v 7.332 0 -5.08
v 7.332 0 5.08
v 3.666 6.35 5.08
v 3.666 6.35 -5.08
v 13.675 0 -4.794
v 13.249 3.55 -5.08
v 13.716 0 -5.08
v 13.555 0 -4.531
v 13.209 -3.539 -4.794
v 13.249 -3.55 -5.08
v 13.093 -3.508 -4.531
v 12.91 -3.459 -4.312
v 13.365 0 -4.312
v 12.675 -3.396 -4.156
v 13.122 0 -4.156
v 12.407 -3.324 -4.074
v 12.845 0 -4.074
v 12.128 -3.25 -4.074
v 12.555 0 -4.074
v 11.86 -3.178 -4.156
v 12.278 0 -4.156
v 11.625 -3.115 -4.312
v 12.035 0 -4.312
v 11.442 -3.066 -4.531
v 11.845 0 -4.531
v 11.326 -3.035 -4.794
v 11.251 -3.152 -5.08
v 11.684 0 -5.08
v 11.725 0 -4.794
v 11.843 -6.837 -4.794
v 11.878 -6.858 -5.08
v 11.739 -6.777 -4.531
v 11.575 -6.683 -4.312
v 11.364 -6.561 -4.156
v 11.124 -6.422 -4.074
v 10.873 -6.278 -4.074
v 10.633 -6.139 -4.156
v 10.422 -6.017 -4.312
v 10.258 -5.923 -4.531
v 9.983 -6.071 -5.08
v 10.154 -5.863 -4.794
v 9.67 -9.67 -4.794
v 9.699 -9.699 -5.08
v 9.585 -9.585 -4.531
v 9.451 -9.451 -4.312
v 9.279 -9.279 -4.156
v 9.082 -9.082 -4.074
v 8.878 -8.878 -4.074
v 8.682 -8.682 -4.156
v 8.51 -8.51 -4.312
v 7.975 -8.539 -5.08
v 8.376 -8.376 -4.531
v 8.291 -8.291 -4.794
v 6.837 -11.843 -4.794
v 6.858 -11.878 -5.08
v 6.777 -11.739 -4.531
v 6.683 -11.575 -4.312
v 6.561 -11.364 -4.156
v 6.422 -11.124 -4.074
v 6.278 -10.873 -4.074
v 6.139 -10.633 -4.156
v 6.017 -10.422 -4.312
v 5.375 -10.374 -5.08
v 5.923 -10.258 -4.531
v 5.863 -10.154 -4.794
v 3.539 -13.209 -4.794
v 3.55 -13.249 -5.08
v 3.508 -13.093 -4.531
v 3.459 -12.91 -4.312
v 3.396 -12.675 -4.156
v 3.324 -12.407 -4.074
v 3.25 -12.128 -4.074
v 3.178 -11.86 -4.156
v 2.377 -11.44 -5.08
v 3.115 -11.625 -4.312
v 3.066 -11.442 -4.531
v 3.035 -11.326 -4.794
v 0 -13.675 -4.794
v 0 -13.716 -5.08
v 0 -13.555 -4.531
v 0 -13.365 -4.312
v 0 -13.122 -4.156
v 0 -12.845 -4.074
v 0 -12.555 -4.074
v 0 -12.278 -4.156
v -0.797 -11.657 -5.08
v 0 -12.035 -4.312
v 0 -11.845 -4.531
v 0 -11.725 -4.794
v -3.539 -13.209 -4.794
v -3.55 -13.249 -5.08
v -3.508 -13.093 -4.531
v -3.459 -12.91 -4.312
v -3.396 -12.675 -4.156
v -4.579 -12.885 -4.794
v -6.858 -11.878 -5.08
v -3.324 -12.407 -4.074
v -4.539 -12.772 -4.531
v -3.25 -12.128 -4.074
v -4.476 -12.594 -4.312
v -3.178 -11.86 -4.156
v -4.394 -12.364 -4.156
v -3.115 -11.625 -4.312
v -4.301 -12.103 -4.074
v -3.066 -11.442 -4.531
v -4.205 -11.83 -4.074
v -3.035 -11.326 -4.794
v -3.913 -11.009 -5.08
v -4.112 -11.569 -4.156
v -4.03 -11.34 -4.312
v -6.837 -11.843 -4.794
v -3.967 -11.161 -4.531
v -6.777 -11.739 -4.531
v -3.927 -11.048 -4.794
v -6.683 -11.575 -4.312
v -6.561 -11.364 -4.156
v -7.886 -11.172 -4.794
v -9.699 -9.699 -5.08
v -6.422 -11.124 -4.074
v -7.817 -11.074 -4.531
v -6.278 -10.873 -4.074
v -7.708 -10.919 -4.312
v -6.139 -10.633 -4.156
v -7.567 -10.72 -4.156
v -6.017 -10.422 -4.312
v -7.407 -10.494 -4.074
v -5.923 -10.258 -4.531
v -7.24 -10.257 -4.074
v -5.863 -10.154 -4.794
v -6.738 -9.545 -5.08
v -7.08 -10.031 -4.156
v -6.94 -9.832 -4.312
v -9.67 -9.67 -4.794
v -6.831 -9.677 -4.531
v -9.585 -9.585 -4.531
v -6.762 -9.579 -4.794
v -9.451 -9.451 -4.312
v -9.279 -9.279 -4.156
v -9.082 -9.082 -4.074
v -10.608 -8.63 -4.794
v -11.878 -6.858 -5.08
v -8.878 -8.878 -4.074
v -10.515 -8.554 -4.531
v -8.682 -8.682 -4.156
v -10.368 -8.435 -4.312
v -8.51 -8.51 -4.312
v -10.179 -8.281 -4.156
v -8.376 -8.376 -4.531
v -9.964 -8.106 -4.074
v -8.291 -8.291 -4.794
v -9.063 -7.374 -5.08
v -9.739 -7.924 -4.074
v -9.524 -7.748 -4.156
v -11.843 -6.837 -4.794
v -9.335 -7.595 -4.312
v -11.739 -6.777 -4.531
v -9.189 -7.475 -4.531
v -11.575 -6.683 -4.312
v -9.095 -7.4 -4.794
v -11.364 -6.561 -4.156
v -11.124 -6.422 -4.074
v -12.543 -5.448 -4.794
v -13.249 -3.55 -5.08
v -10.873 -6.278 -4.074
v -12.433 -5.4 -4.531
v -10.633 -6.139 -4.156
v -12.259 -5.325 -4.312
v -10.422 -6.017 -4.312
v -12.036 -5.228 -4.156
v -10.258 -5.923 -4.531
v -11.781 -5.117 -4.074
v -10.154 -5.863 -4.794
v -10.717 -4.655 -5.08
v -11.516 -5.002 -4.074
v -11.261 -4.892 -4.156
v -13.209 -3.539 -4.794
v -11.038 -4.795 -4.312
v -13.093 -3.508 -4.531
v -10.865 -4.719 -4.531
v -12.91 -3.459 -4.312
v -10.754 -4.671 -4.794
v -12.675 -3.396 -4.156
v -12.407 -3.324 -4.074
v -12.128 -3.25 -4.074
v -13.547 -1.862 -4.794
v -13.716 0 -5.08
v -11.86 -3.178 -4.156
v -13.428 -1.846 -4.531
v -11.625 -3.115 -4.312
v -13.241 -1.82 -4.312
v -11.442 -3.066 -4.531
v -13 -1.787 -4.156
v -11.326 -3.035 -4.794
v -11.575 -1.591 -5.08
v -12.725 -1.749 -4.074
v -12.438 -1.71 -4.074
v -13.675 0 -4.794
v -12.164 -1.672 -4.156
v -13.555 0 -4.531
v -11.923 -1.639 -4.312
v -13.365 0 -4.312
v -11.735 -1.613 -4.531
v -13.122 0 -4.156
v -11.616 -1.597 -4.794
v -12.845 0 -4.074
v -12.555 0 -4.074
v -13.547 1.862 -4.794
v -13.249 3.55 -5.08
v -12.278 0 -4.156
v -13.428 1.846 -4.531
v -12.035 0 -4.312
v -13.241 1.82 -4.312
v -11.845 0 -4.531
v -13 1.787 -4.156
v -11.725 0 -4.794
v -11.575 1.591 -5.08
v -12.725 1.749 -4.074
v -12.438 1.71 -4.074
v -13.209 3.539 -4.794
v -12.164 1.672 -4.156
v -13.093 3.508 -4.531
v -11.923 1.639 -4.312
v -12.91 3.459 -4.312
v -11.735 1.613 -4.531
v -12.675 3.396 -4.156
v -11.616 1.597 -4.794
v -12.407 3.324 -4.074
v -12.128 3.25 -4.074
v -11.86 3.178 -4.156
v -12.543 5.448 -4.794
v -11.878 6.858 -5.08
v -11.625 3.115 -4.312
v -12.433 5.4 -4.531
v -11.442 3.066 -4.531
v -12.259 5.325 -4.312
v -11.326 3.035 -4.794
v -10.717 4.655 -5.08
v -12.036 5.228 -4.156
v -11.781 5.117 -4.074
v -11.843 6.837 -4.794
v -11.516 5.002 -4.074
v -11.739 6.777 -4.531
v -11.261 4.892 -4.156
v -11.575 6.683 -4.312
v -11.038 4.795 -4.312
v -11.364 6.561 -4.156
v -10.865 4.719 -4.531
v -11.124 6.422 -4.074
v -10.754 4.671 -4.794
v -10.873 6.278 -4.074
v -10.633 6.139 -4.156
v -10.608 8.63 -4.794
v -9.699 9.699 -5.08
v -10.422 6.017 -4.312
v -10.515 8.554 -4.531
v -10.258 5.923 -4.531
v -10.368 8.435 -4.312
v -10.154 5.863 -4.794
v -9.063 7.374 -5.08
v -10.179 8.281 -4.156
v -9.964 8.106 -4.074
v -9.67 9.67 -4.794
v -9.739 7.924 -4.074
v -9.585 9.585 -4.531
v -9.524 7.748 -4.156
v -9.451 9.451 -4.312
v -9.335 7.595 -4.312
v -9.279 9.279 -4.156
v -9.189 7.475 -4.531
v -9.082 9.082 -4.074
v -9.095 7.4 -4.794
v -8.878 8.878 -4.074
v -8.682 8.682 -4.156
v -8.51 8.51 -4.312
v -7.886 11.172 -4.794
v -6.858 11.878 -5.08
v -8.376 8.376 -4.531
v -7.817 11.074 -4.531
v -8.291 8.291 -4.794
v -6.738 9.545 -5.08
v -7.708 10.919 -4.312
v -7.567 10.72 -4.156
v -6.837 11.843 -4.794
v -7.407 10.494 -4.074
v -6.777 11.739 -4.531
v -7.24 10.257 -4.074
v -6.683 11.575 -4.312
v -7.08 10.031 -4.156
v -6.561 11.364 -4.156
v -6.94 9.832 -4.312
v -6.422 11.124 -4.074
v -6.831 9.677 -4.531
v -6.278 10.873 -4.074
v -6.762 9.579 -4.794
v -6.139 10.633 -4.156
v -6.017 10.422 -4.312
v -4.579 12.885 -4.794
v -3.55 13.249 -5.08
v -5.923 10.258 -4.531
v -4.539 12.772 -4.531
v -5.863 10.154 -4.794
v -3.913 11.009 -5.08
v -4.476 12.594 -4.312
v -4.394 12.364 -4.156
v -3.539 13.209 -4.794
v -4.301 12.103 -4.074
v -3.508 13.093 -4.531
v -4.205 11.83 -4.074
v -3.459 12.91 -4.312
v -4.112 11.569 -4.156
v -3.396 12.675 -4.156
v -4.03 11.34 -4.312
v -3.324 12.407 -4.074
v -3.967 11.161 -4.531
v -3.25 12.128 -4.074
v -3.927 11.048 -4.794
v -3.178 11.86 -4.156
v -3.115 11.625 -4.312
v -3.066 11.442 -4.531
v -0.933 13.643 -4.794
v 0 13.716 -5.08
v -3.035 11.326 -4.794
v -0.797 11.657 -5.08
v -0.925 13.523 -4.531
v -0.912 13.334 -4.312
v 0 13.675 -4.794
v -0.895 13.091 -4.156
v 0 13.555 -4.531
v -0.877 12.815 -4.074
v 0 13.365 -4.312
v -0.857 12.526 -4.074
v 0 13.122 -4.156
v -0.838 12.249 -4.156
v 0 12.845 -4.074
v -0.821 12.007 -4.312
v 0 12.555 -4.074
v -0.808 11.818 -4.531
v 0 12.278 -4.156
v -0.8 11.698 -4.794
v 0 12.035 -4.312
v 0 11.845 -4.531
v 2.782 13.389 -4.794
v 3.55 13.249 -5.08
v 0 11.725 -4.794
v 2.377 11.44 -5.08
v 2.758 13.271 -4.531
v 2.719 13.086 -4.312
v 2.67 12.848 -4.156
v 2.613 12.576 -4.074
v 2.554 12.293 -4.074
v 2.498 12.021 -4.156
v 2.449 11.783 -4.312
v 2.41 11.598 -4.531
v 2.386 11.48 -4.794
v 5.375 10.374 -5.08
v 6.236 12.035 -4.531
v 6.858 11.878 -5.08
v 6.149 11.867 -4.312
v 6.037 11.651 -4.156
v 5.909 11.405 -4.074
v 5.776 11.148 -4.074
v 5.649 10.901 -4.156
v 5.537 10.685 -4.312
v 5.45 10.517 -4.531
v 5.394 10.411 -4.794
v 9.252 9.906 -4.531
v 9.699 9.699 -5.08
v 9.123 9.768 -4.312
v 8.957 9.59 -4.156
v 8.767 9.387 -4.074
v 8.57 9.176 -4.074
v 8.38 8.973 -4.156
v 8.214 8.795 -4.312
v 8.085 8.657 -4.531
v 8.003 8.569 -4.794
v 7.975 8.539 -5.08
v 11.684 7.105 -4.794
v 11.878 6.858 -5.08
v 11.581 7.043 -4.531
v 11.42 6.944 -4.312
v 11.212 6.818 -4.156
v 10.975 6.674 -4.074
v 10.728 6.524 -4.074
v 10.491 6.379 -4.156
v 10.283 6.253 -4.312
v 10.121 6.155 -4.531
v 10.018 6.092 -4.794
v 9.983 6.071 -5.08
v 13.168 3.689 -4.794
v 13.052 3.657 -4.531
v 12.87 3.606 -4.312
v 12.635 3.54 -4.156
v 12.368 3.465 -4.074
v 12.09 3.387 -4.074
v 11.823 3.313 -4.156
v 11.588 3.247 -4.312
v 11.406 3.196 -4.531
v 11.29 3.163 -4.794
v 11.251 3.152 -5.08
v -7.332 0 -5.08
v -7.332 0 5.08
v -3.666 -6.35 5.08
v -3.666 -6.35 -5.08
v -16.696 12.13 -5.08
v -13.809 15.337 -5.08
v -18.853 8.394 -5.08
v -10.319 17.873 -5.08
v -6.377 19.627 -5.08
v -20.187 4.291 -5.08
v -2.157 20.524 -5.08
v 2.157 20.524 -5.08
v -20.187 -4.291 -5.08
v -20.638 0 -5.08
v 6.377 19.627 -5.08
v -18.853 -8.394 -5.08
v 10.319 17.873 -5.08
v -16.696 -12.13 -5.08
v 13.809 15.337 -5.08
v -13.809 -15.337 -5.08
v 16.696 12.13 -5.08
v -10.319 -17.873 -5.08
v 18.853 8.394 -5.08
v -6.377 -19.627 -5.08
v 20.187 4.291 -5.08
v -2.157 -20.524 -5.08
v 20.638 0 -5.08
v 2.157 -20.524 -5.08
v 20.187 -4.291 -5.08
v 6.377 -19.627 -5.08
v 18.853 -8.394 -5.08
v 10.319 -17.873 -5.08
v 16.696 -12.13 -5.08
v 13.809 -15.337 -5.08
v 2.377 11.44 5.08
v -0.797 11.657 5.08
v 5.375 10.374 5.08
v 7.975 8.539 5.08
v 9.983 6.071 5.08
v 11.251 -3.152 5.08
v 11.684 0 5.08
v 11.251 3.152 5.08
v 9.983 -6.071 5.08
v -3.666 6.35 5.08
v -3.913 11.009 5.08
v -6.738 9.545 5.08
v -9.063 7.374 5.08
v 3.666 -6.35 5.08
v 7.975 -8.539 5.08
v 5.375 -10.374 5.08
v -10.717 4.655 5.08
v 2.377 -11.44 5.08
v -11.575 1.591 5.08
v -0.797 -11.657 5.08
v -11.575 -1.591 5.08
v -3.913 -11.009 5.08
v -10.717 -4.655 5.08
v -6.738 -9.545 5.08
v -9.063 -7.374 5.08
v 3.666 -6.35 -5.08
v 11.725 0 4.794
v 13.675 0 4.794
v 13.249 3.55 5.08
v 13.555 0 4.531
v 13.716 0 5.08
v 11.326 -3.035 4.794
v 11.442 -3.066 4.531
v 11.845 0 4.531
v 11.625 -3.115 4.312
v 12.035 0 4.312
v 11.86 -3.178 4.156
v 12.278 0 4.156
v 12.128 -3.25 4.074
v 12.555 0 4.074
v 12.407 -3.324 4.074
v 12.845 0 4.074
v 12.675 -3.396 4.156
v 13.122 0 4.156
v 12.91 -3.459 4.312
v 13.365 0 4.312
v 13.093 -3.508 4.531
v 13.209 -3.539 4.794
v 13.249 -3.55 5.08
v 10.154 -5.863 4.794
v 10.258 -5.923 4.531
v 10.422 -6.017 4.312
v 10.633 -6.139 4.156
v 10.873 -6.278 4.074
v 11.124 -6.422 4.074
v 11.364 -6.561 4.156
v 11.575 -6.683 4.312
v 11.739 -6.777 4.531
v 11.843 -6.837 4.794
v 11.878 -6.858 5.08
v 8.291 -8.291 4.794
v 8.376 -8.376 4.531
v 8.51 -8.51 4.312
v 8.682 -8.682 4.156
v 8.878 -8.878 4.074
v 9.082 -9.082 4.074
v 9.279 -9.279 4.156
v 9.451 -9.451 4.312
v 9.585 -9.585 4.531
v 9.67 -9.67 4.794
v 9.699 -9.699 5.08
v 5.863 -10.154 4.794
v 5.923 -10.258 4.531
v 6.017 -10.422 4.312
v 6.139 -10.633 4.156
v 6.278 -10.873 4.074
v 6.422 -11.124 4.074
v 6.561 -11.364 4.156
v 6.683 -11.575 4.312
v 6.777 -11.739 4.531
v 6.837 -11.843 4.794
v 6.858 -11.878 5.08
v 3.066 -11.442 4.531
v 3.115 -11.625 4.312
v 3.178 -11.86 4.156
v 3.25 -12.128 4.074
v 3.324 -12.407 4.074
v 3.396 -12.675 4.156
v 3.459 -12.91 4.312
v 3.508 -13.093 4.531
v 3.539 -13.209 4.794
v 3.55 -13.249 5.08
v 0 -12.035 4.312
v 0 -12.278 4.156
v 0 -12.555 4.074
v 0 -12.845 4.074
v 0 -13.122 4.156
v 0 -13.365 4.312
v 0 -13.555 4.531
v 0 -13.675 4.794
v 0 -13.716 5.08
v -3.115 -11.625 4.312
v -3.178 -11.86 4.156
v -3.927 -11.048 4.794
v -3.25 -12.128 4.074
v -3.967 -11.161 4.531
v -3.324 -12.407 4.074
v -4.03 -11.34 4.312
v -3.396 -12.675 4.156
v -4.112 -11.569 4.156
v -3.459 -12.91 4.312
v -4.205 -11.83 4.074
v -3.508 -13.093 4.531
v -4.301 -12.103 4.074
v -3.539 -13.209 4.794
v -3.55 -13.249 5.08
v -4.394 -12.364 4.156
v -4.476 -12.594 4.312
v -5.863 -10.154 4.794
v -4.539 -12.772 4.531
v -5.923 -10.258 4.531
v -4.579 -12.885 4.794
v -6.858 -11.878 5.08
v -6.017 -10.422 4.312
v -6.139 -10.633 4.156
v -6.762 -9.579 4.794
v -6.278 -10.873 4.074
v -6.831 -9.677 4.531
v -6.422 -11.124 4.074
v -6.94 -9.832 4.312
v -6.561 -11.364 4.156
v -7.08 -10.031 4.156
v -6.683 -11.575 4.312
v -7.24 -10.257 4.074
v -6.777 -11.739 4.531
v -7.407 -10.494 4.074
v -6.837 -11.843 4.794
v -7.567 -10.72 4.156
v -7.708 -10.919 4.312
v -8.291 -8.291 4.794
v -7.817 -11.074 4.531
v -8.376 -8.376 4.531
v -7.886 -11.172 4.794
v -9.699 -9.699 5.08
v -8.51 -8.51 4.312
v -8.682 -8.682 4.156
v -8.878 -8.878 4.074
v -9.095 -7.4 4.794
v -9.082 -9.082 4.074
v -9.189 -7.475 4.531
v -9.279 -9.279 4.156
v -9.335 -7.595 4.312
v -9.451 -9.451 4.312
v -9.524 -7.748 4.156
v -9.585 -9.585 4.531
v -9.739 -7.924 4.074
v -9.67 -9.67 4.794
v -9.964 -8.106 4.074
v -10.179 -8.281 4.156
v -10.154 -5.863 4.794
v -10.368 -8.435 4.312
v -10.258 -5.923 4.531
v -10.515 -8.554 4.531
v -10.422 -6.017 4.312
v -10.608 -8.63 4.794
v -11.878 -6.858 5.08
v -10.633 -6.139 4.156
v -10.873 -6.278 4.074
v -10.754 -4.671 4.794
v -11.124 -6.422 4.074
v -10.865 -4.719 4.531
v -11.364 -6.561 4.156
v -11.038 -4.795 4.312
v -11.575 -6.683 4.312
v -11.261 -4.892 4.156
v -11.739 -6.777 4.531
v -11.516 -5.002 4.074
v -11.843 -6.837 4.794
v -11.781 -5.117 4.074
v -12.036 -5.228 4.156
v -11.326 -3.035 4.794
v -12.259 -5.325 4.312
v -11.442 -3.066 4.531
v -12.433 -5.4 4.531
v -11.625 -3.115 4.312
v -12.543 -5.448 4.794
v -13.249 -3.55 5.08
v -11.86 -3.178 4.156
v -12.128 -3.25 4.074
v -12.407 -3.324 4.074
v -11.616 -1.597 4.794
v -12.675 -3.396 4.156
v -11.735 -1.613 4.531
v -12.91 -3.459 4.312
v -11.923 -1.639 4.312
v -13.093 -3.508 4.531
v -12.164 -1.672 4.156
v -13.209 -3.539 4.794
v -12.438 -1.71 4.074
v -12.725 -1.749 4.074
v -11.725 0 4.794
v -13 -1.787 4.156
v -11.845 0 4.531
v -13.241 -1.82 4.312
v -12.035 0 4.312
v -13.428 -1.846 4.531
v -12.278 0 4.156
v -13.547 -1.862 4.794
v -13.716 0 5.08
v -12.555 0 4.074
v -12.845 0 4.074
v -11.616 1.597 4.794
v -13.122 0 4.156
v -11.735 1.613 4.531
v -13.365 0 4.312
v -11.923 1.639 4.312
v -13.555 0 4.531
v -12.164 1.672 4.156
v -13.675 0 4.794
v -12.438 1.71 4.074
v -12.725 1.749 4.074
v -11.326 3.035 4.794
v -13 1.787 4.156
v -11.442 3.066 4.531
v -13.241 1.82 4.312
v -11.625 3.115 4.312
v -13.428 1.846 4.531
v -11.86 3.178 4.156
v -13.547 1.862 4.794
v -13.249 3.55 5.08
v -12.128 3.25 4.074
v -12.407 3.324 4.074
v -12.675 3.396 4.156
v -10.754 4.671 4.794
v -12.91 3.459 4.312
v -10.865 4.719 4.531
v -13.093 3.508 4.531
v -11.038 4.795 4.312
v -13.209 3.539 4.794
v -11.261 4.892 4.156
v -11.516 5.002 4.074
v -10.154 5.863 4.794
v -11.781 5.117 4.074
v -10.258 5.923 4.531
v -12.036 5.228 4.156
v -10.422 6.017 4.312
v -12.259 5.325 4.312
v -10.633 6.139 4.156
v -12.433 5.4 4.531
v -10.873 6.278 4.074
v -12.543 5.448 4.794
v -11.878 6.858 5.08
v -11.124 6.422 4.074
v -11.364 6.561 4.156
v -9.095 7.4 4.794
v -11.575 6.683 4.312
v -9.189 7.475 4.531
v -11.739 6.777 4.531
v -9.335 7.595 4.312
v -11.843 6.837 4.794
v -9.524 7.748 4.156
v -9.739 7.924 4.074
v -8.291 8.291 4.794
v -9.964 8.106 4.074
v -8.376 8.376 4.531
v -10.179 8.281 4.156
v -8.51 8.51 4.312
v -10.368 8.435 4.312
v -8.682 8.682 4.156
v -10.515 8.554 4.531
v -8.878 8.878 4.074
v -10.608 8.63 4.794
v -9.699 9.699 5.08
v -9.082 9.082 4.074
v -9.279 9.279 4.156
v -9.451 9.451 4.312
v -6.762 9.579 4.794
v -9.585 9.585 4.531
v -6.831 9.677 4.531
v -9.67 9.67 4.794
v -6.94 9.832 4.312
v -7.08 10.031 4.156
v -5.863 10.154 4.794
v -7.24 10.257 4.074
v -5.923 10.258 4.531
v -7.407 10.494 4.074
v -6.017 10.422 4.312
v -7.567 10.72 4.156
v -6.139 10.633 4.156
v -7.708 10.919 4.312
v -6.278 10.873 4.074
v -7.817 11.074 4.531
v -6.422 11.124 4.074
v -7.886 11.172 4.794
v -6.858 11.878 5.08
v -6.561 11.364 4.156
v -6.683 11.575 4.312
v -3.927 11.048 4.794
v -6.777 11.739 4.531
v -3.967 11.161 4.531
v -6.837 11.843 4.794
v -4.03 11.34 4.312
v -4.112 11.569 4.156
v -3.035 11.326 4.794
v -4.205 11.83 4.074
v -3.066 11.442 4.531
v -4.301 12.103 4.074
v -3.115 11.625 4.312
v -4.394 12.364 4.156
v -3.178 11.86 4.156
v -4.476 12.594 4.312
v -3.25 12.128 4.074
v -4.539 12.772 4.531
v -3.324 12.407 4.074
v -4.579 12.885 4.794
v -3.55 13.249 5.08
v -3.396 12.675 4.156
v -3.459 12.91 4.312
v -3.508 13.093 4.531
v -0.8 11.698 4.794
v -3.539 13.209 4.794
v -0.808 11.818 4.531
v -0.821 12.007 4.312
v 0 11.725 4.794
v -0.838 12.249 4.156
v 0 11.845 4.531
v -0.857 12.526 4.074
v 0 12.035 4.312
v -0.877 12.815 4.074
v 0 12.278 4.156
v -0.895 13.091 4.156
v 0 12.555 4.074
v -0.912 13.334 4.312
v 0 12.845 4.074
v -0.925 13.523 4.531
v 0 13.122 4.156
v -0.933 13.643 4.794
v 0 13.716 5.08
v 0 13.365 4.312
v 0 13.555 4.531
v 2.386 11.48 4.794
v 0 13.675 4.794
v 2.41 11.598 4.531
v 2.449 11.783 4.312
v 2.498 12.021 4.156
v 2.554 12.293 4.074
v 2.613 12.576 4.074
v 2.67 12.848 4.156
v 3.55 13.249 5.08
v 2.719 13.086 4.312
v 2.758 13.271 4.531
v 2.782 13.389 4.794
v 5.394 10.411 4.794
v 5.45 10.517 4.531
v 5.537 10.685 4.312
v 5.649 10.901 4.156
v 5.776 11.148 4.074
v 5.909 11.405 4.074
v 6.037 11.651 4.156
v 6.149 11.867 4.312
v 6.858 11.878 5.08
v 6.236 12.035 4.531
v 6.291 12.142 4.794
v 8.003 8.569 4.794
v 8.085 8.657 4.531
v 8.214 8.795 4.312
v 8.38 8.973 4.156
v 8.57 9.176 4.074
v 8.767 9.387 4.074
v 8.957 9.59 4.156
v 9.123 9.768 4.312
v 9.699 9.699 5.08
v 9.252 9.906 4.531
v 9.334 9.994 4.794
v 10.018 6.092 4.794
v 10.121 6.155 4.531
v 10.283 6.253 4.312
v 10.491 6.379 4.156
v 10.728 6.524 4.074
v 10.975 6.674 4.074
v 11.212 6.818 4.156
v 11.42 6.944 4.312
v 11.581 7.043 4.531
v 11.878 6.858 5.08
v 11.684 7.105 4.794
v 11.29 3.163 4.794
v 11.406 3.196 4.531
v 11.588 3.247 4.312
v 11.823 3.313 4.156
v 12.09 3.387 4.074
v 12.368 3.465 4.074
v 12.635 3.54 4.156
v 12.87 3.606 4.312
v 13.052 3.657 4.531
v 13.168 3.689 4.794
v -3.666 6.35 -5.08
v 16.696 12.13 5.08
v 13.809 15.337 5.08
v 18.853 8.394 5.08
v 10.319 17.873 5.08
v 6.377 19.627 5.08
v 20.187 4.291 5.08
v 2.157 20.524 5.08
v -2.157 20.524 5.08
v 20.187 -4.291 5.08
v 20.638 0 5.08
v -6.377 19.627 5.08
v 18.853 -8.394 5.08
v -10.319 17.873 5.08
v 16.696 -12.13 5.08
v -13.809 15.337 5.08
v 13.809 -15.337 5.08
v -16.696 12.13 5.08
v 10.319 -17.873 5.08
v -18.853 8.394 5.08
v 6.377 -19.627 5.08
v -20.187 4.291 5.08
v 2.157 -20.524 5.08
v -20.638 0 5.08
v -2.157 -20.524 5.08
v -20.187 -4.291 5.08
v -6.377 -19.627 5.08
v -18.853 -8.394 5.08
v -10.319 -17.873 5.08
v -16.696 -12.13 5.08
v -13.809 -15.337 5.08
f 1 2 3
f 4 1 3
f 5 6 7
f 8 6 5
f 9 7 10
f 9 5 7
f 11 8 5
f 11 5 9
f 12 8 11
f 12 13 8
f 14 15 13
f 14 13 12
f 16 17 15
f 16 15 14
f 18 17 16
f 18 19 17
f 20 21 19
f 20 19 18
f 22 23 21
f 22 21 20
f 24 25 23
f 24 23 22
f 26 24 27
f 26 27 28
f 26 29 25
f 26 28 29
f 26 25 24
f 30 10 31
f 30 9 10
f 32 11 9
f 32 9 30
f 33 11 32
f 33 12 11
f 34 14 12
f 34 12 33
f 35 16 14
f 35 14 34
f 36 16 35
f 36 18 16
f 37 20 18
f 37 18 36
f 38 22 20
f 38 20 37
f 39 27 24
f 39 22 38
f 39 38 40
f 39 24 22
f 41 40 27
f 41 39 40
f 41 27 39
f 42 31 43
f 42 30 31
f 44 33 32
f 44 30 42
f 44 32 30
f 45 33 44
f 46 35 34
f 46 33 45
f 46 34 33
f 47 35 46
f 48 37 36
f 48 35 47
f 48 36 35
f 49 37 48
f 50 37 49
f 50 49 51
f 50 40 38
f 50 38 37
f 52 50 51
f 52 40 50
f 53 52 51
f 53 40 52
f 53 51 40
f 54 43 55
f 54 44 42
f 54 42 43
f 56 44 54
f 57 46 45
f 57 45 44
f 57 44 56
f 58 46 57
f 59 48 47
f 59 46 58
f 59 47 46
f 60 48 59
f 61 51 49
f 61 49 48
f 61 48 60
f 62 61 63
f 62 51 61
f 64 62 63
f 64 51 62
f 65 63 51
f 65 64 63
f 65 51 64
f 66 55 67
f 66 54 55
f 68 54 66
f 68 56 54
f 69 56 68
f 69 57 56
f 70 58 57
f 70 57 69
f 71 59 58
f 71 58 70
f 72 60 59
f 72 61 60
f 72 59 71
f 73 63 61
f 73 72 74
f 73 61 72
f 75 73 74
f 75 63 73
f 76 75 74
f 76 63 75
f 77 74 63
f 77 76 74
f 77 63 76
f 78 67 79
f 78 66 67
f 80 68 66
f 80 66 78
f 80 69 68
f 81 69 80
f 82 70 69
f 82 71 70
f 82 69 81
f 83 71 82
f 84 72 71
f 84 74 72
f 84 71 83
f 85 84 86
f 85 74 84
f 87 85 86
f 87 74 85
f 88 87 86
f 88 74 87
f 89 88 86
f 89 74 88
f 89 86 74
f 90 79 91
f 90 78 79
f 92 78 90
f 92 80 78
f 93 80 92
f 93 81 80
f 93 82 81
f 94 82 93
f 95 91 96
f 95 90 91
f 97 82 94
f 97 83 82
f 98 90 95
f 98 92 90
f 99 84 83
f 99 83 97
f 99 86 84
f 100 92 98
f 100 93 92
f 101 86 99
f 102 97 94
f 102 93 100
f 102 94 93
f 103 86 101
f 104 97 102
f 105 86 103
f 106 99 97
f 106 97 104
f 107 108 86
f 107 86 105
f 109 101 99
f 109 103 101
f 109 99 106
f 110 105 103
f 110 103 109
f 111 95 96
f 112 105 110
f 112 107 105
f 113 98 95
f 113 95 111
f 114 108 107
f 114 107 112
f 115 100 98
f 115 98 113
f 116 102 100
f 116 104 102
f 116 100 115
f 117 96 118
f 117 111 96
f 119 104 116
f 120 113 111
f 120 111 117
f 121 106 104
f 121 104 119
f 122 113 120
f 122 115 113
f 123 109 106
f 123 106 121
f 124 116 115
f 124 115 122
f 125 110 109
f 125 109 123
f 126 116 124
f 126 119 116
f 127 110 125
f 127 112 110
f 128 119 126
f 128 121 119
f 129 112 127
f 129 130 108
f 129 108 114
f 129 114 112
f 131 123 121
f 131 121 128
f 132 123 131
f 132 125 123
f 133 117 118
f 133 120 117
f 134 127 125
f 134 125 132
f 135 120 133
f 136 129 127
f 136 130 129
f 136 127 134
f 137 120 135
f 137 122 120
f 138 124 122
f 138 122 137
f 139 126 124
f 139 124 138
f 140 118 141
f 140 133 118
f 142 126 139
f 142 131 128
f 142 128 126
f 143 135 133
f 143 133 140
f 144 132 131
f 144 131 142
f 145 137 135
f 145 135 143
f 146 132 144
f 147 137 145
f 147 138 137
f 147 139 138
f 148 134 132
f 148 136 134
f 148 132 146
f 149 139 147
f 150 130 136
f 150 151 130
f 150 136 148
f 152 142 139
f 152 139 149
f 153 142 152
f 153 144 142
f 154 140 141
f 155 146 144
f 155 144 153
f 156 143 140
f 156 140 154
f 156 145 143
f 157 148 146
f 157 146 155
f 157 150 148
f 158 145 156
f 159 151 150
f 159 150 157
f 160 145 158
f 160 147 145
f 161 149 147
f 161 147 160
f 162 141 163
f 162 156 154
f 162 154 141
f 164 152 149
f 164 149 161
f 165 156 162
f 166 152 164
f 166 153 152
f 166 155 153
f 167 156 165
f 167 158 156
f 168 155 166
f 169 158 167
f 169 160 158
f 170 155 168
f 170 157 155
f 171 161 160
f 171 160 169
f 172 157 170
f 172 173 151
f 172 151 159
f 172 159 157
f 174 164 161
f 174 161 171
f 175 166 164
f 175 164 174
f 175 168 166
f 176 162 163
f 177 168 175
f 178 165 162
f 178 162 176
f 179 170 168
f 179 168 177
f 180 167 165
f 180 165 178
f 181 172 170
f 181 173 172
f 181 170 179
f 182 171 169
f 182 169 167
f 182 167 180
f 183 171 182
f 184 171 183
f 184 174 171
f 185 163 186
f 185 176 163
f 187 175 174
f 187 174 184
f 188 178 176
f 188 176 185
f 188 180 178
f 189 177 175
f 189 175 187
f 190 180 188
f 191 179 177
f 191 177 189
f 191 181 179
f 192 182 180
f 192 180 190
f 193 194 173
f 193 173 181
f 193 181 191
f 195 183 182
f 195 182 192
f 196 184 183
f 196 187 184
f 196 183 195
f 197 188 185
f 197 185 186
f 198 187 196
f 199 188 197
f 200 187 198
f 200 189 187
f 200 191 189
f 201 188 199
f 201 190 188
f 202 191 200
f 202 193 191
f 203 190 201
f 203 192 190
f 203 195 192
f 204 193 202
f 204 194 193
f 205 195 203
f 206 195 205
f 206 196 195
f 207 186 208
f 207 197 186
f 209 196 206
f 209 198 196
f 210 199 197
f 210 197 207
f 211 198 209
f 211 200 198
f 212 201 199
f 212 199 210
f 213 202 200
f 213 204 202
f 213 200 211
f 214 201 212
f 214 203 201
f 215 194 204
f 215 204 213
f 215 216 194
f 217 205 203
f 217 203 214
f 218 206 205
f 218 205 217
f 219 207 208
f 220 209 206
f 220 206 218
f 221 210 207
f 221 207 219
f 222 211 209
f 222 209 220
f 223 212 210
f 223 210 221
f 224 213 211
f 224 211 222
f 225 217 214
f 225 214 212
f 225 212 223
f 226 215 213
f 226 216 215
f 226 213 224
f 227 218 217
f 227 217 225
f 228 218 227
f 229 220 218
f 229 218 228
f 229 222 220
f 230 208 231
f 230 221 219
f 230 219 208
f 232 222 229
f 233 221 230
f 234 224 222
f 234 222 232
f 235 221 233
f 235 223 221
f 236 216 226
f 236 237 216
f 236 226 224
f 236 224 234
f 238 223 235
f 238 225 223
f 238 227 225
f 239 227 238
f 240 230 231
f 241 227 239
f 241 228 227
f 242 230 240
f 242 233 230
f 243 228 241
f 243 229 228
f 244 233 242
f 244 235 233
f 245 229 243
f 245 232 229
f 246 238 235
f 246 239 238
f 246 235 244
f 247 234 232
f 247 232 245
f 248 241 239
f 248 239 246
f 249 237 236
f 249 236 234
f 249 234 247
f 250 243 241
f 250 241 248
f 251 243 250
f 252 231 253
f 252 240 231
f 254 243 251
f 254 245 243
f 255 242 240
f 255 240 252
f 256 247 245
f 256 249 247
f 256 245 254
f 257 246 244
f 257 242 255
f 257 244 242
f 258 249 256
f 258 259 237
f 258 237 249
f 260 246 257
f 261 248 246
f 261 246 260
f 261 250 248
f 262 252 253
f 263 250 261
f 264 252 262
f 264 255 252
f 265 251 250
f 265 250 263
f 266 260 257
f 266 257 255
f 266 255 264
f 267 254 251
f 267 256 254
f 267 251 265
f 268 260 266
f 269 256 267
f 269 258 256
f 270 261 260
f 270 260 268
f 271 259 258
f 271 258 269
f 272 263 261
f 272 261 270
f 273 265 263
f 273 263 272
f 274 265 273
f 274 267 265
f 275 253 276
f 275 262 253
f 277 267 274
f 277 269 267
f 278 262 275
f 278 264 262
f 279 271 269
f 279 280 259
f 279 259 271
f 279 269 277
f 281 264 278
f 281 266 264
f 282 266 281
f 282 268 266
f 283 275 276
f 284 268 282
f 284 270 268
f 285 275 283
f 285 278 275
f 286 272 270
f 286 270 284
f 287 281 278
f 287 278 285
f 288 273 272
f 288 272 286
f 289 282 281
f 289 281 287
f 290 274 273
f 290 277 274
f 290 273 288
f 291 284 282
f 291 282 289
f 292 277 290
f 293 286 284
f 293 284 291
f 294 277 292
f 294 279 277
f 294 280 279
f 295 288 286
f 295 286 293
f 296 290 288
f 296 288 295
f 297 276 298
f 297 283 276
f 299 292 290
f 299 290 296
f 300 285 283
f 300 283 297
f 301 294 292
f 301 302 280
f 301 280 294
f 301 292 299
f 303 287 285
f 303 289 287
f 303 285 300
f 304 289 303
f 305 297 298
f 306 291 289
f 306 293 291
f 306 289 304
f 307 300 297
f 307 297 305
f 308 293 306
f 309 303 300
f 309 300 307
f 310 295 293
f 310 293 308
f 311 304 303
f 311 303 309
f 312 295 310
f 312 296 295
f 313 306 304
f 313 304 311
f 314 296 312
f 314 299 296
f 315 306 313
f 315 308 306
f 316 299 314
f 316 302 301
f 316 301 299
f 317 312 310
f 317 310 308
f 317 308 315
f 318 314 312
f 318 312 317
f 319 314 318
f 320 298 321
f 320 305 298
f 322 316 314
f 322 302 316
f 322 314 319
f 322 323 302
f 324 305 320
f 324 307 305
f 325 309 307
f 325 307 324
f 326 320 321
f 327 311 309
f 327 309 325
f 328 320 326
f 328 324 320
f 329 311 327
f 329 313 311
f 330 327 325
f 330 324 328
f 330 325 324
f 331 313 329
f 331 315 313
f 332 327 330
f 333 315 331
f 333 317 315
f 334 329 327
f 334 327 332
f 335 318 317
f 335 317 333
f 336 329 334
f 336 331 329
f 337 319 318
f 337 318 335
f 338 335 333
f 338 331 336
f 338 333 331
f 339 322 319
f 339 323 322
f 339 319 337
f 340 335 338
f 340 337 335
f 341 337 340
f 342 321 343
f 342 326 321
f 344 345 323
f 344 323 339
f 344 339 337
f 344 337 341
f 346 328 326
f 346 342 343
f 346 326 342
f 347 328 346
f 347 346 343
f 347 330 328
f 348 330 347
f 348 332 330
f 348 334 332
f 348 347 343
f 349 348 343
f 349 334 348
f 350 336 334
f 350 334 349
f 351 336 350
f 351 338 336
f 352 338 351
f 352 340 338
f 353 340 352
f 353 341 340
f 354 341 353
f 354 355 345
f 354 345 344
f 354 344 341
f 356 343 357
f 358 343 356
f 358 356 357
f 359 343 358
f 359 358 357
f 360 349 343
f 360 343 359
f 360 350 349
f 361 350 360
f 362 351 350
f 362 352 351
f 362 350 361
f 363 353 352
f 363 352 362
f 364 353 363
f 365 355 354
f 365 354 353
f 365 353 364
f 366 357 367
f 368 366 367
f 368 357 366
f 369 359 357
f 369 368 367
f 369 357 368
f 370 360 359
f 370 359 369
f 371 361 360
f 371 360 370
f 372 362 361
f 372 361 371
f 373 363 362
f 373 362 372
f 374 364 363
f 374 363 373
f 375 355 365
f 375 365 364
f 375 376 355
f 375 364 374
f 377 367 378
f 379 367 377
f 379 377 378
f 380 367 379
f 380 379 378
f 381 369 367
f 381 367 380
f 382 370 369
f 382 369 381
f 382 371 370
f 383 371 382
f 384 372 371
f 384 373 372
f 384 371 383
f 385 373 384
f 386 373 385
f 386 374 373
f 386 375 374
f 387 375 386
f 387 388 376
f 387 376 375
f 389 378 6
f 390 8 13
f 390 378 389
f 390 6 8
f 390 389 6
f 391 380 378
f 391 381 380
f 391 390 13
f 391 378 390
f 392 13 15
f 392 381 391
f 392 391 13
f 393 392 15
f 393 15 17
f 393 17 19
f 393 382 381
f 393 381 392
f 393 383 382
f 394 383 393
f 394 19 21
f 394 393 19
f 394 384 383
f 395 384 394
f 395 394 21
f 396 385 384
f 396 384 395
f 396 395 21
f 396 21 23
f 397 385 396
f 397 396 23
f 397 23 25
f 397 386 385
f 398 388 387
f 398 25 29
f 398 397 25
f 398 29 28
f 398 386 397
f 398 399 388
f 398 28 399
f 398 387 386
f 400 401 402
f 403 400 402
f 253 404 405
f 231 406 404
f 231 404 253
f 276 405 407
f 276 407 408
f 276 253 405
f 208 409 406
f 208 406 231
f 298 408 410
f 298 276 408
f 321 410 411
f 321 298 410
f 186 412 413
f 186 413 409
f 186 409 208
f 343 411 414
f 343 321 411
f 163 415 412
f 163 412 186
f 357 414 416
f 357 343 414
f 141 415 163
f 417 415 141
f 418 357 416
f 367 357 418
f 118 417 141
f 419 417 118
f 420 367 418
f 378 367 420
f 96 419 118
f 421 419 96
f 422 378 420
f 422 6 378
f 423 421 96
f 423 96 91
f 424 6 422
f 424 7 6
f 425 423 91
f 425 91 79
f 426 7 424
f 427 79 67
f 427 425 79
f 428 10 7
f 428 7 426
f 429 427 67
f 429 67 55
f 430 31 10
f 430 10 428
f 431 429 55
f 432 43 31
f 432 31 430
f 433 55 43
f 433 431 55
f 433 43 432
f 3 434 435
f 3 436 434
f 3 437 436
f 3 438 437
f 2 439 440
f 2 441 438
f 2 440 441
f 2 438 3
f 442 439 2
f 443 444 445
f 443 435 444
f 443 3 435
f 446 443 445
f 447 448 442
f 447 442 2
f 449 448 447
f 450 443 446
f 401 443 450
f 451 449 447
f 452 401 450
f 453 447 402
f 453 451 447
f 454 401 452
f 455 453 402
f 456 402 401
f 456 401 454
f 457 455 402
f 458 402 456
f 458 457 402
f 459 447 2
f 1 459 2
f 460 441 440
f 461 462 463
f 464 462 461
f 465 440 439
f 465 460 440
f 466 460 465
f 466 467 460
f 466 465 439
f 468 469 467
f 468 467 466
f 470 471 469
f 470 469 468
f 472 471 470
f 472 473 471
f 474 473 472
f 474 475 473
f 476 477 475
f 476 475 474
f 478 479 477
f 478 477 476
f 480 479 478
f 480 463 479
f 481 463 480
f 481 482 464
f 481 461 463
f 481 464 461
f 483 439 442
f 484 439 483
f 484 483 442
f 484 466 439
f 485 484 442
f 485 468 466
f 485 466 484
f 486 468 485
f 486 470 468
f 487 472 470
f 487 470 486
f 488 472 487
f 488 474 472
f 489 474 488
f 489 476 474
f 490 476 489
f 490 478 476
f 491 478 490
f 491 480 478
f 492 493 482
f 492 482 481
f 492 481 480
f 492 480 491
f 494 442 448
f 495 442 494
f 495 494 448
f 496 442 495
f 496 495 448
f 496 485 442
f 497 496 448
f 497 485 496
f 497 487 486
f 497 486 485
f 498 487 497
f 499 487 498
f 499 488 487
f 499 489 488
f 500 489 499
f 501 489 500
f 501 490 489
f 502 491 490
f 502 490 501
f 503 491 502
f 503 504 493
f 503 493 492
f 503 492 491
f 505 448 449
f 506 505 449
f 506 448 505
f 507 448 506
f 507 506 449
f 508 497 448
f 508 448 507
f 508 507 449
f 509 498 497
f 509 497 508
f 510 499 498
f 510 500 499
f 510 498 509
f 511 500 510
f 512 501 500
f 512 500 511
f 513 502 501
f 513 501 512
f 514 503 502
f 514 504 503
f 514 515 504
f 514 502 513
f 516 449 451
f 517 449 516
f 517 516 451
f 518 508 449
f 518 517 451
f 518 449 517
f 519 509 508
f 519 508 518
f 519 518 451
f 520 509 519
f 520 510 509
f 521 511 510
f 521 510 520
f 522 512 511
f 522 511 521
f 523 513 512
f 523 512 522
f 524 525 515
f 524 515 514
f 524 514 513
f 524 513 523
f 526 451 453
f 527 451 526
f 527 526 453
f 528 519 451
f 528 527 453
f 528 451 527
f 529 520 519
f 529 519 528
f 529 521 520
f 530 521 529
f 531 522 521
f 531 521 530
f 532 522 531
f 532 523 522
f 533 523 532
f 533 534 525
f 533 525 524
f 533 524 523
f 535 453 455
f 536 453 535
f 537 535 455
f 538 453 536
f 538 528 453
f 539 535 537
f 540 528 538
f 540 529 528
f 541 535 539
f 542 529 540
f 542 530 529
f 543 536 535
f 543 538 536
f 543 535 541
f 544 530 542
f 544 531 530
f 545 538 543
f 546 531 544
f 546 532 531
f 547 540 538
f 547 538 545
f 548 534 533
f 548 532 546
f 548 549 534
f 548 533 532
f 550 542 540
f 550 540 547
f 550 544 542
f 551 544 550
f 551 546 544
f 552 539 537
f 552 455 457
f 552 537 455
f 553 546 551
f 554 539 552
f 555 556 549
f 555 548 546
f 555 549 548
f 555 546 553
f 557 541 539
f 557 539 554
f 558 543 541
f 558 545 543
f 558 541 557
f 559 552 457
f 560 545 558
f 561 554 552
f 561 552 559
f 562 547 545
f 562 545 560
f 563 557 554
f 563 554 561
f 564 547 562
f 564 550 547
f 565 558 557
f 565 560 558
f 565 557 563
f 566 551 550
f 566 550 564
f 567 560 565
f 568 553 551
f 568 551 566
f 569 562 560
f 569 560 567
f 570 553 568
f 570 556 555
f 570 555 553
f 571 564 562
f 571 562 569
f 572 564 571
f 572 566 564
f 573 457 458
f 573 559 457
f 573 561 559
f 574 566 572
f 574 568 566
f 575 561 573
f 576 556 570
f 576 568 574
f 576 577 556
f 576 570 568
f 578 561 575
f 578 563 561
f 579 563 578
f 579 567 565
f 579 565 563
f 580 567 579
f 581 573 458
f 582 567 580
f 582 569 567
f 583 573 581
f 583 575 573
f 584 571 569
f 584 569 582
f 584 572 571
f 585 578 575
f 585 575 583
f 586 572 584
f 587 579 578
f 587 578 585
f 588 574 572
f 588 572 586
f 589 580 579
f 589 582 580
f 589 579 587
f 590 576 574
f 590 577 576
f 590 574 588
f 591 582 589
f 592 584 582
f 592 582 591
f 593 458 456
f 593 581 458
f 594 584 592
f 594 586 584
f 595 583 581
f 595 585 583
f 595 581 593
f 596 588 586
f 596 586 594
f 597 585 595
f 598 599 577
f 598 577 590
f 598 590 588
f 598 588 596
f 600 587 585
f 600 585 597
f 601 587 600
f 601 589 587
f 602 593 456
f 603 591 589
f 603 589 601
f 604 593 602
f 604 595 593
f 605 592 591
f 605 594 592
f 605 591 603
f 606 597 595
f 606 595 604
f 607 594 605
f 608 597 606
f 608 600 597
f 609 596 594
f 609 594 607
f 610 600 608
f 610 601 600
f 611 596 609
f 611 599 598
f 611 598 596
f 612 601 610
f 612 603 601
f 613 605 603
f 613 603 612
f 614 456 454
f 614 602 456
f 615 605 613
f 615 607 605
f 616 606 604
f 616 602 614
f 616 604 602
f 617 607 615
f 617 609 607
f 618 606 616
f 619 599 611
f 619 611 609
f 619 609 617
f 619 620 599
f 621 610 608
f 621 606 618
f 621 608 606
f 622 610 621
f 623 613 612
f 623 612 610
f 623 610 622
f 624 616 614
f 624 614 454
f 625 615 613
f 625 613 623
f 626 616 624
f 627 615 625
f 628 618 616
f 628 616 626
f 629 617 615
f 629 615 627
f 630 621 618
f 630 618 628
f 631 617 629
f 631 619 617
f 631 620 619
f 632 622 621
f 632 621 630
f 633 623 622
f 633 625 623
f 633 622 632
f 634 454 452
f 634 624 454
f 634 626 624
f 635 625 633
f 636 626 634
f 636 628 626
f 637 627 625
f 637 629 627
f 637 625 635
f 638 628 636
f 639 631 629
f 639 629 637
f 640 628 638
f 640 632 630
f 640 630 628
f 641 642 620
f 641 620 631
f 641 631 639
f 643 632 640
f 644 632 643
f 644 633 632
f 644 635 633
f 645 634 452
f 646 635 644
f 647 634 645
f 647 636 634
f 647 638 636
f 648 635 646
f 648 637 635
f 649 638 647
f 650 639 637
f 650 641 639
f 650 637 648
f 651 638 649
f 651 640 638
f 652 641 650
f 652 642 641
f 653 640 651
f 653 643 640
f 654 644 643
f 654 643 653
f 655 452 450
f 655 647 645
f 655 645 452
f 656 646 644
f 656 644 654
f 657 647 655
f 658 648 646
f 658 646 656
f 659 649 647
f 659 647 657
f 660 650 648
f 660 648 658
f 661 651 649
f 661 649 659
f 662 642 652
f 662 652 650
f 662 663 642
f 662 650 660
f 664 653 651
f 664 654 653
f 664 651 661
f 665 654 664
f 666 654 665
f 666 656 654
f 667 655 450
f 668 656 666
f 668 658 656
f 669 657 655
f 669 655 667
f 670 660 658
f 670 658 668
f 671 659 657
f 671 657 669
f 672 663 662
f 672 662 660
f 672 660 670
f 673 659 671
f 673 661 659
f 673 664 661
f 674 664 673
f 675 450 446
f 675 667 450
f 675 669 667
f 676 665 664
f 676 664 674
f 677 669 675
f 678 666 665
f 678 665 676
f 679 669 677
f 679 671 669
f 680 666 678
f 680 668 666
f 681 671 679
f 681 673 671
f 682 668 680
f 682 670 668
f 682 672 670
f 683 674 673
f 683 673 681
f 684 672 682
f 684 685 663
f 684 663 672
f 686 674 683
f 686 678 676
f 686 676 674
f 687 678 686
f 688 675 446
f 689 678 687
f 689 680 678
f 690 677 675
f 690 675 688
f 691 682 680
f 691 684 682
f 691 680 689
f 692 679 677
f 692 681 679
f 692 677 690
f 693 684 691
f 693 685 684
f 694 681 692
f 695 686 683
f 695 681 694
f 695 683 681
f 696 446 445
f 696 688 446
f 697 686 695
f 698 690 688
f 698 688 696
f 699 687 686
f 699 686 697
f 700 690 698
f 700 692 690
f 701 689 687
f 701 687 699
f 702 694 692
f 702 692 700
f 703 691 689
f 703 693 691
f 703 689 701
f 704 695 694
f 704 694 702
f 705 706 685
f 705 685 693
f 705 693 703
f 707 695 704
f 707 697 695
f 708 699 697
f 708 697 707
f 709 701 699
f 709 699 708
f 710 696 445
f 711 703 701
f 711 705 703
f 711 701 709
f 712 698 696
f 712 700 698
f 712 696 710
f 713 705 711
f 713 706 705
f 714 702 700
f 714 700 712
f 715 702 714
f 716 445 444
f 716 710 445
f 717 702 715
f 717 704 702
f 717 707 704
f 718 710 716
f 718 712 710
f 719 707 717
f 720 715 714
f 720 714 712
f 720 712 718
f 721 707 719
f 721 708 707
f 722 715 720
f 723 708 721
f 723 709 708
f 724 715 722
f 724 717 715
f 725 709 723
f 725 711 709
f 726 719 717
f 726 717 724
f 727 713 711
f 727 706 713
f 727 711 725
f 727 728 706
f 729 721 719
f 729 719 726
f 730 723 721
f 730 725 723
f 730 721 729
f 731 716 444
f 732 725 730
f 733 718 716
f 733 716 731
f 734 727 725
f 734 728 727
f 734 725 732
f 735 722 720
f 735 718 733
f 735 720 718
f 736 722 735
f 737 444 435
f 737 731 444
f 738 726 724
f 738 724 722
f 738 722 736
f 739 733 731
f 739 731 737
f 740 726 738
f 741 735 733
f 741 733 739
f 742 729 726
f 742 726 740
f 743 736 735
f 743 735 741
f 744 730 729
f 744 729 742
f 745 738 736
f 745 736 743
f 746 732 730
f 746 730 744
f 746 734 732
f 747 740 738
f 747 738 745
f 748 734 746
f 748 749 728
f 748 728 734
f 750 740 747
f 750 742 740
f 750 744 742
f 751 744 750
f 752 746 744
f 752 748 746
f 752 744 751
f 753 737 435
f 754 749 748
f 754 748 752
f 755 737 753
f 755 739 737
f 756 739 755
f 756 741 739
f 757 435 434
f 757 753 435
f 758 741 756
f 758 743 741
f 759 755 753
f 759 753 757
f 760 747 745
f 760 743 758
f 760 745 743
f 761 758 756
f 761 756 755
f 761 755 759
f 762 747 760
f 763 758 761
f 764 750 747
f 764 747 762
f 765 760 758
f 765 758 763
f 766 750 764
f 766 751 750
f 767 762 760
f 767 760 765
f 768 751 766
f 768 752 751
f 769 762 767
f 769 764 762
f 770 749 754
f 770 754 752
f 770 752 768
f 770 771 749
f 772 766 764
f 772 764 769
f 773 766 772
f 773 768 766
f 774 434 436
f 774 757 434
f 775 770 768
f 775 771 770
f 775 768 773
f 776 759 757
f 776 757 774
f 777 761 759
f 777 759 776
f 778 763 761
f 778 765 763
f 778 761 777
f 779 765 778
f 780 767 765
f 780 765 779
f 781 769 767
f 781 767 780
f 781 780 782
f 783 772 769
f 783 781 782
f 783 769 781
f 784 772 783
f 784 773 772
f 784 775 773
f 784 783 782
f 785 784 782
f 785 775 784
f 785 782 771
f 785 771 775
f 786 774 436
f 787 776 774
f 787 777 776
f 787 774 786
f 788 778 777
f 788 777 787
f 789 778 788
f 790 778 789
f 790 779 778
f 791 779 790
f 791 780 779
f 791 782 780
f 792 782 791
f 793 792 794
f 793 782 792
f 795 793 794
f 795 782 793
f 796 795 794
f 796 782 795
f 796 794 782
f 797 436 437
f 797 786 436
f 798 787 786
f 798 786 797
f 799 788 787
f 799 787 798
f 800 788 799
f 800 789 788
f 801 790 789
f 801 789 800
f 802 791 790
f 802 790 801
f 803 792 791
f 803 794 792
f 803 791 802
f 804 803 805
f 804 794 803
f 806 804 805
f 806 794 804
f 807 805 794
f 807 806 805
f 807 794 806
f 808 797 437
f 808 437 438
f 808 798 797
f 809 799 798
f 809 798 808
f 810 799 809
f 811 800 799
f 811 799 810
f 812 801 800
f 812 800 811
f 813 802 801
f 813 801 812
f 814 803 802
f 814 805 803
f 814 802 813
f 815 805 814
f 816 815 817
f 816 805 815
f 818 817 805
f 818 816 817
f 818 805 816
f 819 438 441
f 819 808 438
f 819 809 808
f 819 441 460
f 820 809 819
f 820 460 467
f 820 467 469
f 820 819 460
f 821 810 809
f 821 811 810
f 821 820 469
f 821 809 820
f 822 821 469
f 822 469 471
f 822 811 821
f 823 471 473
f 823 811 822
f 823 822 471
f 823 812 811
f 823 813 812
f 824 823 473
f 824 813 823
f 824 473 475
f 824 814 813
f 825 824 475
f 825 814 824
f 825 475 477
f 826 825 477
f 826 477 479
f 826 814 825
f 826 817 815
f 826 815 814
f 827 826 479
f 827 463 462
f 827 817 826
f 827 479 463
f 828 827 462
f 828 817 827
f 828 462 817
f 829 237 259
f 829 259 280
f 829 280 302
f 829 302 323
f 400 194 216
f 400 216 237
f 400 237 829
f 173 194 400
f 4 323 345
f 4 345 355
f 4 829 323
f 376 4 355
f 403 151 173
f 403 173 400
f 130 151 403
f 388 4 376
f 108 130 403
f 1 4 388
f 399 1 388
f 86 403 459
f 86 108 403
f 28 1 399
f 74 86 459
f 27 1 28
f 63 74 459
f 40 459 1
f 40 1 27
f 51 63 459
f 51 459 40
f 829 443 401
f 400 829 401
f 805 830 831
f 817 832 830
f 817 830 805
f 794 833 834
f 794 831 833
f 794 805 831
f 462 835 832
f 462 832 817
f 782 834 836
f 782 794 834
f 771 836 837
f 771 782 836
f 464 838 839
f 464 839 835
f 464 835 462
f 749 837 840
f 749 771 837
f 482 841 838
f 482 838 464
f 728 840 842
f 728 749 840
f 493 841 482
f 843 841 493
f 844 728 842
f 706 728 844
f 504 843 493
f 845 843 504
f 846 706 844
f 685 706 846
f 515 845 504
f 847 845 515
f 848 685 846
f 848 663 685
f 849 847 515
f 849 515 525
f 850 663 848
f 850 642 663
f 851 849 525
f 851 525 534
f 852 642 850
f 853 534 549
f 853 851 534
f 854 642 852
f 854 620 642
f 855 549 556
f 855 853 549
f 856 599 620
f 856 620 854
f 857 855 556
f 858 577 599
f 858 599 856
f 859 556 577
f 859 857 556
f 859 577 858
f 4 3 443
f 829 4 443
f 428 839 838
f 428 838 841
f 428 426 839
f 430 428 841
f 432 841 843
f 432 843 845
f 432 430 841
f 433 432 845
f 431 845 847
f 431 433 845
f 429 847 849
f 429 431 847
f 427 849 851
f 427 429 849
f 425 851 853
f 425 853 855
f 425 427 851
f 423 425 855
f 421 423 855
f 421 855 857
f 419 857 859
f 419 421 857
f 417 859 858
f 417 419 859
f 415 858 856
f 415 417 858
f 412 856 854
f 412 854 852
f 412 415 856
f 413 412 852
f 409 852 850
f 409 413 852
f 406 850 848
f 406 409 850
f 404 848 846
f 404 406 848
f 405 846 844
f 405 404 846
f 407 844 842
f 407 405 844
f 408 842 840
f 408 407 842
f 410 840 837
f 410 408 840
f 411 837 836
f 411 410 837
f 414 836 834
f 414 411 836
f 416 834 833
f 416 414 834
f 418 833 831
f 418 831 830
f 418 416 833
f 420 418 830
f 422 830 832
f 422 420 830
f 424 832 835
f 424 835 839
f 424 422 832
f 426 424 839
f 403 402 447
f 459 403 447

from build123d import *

# Parameters (mm, degrees)
CUT_EXTRUDE1_REACH = 32.904


with BuildPart() as part:
    # Sketch1 → Revolve1 (revolve)
    with BuildSketch(Plane(origin=(0, 0, 0), x_dir=(0, 0, -1), z_dir=(1, 0, 0)), mode=Mode.PRIVATE) as revolve1_sk:
        with BuildLine():
            Line((-5.08, 20.6375), (5.08, 20.6375))
            Line((5.08, 20.6375), (5.08, 13.716))
            ThreePointArc((5.08, 13.716), (4.064, 12.7), (5.08, 11.684))
            Line((5.08, 11.684), (5.08, 0))
            Line((5.08, 0), (-5.08, 0))
            Line((-5.08, 0), (-5.08, 11.684))
            ThreePointArc((-5.08, 11.684), (-4.064, 12.7), (-5.08, 13.716))
            Line((-5.08, 13.716), (-5.08, 20.6375))
        make_face()
    revolve(revolve1_sk.sketch.rotate(Axis((0, 0, 5.08), (0, 0, -1)), 90), axis=Axis((0, 0, 5.08), (0, 0, -1)))

    # Sketch2 → Cut-Extrude1 (cut, up to next)
    with BuildSketch(Plane.XY.offset(5.08), mode=Mode.PRIVATE) as cut_extrude1_sk1:
        Polygon((-3.666174209, 6.35), (-7.332348419, 0), (-3.666174209, -6.35), (3.666174209, -6.35), (7.332348419, 0), (3.666174209, 6.35), align=None)
    cut_extrude1_tool1 = extrude(cut_extrude1_sk1.sketch, amount=-CUT_EXTRUDE1_REACH, mode=Mode.PRIVATE) & part.part
    add(cut_extrude1_tool1.solids().sort_by_distance((0, 0, 5.08))[0], mode=Mode.SUBTRACT)


solid = part.part
